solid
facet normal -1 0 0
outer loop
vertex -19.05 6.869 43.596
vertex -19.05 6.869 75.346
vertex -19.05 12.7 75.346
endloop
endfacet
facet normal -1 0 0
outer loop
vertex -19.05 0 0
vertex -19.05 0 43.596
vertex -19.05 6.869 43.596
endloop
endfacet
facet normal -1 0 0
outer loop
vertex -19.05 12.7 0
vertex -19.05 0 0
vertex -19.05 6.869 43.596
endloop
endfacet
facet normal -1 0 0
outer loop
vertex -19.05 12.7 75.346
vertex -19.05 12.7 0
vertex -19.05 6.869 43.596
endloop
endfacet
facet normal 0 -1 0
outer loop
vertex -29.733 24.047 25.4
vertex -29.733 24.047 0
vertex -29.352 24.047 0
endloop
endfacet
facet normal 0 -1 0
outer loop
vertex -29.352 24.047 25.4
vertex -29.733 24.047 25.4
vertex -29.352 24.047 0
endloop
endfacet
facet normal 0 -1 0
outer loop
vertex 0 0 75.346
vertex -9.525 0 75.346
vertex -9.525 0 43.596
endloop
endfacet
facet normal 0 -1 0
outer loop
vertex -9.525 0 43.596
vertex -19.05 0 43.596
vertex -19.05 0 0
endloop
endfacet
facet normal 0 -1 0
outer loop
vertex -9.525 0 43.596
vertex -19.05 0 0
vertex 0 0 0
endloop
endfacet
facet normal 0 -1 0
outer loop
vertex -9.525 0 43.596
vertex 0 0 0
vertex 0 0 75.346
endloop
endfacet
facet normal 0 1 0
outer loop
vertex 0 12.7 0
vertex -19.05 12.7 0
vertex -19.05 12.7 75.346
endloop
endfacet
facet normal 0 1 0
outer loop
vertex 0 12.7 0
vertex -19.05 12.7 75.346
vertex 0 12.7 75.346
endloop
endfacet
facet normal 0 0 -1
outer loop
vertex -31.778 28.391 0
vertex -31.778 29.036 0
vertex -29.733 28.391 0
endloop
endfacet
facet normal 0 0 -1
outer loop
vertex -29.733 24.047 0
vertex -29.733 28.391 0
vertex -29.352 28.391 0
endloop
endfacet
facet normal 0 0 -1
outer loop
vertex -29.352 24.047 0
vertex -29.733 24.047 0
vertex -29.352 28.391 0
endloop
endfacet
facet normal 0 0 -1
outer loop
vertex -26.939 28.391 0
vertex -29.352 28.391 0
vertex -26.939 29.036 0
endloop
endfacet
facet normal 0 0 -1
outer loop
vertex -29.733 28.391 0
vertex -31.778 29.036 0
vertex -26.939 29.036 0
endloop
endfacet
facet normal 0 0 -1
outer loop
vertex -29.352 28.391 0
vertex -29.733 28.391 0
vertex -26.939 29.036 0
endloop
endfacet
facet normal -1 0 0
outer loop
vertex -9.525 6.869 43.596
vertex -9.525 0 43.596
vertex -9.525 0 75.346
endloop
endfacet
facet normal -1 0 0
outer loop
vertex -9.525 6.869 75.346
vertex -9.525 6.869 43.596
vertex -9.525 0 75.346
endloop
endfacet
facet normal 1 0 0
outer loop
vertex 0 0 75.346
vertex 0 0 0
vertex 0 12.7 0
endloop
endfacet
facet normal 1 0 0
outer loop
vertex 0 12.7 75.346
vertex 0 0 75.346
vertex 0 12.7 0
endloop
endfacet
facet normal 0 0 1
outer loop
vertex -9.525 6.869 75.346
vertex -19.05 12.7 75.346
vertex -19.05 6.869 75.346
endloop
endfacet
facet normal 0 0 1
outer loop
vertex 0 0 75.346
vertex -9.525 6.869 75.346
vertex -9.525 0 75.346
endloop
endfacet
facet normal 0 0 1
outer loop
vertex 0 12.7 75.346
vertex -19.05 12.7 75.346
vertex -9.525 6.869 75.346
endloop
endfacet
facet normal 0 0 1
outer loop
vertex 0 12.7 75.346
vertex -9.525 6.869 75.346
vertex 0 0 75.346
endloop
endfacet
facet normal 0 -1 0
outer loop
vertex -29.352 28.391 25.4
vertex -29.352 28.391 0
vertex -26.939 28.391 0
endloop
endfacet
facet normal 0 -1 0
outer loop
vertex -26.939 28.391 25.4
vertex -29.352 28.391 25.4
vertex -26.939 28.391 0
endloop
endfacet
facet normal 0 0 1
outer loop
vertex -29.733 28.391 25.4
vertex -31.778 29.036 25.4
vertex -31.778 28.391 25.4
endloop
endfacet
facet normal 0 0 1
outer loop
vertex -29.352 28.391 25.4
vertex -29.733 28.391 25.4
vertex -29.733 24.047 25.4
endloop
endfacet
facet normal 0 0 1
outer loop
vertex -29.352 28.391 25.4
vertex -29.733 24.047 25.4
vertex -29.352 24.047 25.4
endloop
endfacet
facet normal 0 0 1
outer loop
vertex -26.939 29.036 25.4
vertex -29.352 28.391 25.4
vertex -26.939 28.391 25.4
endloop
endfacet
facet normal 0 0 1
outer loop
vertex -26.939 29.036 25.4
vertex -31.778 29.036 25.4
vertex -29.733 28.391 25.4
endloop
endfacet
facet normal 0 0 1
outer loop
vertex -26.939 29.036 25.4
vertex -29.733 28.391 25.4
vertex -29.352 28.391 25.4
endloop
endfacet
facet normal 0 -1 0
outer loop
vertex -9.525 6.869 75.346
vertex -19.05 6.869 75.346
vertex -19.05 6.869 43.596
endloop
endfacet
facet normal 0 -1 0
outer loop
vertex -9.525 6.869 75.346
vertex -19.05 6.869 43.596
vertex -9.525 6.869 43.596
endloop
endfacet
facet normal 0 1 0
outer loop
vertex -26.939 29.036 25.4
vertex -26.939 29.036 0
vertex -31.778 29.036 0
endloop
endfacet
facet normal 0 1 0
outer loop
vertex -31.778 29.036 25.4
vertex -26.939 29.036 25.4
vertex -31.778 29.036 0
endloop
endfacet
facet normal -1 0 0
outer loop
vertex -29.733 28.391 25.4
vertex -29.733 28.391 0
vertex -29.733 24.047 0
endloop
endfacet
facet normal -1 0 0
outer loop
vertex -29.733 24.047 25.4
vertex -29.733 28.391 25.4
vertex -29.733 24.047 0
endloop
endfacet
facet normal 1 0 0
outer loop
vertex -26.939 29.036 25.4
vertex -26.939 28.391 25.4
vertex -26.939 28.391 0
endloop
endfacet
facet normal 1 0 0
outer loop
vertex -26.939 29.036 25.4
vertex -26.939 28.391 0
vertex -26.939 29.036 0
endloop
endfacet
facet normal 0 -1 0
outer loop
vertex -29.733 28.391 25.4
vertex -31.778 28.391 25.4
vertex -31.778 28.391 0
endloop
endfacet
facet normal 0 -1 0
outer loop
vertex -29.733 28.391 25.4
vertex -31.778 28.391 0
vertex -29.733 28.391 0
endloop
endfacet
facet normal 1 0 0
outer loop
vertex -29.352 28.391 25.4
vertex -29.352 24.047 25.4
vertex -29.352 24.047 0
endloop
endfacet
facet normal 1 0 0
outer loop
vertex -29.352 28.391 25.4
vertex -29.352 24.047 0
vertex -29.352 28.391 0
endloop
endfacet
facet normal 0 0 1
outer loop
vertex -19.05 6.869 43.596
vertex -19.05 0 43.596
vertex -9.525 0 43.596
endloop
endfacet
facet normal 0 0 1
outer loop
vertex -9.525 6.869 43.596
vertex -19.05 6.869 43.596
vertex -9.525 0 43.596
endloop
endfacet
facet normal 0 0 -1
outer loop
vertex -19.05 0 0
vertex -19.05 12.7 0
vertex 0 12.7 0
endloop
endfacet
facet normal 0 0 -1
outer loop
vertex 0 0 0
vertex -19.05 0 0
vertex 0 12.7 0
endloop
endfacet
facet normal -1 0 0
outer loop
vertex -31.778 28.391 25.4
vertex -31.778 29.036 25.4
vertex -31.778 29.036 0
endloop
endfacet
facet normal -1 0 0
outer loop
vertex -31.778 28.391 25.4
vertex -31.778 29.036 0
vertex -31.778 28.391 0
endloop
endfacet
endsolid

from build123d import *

# Parameters (mm, degrees)
F1_DEPTH = 25.4
F2_W     = 19.05
F2_H     = 12.7
F3_DEPTH = 75.346
F4_W     = 9.525
F4_H     = 31.75
F5_DEPTH = 6.86911


with BuildPart() as f1:
    # F0 (on Top) → F1 (new body)
    with BuildSketch(Plane.XY):
        Polygon((-29.351966, 28.390644), (-26.938852, 28.390644), (-26.938852, 29.035889), (-31.778164, 29.035889), (-31.778164, 28.390644), (-29.733038, 28.390644), (-29.733038, 24.046851), (-29.351966, 24.046851), align=None)
    extrude(amount=F1_DEPTH)


with BuildPart() as f3:
    # F2 (on Top) → F3 (new body)
    with BuildSketch(Plane.XY):
        with Locations((-9.525, 6.35)):
            Rectangle(F2_W, F2_H)
    extrude(amount=F3_DEPTH)

    # F4 (on face) → F5 (cut)
    with BuildSketch(Plane.XZ):
        with Locations((-14.2875, 59.471)):
            Rectangle(F4_W, F4_H)
    extrude(amount=-F5_DEPTH, mode=Mode.SUBTRACT)


solid = Compound([f1.part, f3.part])
